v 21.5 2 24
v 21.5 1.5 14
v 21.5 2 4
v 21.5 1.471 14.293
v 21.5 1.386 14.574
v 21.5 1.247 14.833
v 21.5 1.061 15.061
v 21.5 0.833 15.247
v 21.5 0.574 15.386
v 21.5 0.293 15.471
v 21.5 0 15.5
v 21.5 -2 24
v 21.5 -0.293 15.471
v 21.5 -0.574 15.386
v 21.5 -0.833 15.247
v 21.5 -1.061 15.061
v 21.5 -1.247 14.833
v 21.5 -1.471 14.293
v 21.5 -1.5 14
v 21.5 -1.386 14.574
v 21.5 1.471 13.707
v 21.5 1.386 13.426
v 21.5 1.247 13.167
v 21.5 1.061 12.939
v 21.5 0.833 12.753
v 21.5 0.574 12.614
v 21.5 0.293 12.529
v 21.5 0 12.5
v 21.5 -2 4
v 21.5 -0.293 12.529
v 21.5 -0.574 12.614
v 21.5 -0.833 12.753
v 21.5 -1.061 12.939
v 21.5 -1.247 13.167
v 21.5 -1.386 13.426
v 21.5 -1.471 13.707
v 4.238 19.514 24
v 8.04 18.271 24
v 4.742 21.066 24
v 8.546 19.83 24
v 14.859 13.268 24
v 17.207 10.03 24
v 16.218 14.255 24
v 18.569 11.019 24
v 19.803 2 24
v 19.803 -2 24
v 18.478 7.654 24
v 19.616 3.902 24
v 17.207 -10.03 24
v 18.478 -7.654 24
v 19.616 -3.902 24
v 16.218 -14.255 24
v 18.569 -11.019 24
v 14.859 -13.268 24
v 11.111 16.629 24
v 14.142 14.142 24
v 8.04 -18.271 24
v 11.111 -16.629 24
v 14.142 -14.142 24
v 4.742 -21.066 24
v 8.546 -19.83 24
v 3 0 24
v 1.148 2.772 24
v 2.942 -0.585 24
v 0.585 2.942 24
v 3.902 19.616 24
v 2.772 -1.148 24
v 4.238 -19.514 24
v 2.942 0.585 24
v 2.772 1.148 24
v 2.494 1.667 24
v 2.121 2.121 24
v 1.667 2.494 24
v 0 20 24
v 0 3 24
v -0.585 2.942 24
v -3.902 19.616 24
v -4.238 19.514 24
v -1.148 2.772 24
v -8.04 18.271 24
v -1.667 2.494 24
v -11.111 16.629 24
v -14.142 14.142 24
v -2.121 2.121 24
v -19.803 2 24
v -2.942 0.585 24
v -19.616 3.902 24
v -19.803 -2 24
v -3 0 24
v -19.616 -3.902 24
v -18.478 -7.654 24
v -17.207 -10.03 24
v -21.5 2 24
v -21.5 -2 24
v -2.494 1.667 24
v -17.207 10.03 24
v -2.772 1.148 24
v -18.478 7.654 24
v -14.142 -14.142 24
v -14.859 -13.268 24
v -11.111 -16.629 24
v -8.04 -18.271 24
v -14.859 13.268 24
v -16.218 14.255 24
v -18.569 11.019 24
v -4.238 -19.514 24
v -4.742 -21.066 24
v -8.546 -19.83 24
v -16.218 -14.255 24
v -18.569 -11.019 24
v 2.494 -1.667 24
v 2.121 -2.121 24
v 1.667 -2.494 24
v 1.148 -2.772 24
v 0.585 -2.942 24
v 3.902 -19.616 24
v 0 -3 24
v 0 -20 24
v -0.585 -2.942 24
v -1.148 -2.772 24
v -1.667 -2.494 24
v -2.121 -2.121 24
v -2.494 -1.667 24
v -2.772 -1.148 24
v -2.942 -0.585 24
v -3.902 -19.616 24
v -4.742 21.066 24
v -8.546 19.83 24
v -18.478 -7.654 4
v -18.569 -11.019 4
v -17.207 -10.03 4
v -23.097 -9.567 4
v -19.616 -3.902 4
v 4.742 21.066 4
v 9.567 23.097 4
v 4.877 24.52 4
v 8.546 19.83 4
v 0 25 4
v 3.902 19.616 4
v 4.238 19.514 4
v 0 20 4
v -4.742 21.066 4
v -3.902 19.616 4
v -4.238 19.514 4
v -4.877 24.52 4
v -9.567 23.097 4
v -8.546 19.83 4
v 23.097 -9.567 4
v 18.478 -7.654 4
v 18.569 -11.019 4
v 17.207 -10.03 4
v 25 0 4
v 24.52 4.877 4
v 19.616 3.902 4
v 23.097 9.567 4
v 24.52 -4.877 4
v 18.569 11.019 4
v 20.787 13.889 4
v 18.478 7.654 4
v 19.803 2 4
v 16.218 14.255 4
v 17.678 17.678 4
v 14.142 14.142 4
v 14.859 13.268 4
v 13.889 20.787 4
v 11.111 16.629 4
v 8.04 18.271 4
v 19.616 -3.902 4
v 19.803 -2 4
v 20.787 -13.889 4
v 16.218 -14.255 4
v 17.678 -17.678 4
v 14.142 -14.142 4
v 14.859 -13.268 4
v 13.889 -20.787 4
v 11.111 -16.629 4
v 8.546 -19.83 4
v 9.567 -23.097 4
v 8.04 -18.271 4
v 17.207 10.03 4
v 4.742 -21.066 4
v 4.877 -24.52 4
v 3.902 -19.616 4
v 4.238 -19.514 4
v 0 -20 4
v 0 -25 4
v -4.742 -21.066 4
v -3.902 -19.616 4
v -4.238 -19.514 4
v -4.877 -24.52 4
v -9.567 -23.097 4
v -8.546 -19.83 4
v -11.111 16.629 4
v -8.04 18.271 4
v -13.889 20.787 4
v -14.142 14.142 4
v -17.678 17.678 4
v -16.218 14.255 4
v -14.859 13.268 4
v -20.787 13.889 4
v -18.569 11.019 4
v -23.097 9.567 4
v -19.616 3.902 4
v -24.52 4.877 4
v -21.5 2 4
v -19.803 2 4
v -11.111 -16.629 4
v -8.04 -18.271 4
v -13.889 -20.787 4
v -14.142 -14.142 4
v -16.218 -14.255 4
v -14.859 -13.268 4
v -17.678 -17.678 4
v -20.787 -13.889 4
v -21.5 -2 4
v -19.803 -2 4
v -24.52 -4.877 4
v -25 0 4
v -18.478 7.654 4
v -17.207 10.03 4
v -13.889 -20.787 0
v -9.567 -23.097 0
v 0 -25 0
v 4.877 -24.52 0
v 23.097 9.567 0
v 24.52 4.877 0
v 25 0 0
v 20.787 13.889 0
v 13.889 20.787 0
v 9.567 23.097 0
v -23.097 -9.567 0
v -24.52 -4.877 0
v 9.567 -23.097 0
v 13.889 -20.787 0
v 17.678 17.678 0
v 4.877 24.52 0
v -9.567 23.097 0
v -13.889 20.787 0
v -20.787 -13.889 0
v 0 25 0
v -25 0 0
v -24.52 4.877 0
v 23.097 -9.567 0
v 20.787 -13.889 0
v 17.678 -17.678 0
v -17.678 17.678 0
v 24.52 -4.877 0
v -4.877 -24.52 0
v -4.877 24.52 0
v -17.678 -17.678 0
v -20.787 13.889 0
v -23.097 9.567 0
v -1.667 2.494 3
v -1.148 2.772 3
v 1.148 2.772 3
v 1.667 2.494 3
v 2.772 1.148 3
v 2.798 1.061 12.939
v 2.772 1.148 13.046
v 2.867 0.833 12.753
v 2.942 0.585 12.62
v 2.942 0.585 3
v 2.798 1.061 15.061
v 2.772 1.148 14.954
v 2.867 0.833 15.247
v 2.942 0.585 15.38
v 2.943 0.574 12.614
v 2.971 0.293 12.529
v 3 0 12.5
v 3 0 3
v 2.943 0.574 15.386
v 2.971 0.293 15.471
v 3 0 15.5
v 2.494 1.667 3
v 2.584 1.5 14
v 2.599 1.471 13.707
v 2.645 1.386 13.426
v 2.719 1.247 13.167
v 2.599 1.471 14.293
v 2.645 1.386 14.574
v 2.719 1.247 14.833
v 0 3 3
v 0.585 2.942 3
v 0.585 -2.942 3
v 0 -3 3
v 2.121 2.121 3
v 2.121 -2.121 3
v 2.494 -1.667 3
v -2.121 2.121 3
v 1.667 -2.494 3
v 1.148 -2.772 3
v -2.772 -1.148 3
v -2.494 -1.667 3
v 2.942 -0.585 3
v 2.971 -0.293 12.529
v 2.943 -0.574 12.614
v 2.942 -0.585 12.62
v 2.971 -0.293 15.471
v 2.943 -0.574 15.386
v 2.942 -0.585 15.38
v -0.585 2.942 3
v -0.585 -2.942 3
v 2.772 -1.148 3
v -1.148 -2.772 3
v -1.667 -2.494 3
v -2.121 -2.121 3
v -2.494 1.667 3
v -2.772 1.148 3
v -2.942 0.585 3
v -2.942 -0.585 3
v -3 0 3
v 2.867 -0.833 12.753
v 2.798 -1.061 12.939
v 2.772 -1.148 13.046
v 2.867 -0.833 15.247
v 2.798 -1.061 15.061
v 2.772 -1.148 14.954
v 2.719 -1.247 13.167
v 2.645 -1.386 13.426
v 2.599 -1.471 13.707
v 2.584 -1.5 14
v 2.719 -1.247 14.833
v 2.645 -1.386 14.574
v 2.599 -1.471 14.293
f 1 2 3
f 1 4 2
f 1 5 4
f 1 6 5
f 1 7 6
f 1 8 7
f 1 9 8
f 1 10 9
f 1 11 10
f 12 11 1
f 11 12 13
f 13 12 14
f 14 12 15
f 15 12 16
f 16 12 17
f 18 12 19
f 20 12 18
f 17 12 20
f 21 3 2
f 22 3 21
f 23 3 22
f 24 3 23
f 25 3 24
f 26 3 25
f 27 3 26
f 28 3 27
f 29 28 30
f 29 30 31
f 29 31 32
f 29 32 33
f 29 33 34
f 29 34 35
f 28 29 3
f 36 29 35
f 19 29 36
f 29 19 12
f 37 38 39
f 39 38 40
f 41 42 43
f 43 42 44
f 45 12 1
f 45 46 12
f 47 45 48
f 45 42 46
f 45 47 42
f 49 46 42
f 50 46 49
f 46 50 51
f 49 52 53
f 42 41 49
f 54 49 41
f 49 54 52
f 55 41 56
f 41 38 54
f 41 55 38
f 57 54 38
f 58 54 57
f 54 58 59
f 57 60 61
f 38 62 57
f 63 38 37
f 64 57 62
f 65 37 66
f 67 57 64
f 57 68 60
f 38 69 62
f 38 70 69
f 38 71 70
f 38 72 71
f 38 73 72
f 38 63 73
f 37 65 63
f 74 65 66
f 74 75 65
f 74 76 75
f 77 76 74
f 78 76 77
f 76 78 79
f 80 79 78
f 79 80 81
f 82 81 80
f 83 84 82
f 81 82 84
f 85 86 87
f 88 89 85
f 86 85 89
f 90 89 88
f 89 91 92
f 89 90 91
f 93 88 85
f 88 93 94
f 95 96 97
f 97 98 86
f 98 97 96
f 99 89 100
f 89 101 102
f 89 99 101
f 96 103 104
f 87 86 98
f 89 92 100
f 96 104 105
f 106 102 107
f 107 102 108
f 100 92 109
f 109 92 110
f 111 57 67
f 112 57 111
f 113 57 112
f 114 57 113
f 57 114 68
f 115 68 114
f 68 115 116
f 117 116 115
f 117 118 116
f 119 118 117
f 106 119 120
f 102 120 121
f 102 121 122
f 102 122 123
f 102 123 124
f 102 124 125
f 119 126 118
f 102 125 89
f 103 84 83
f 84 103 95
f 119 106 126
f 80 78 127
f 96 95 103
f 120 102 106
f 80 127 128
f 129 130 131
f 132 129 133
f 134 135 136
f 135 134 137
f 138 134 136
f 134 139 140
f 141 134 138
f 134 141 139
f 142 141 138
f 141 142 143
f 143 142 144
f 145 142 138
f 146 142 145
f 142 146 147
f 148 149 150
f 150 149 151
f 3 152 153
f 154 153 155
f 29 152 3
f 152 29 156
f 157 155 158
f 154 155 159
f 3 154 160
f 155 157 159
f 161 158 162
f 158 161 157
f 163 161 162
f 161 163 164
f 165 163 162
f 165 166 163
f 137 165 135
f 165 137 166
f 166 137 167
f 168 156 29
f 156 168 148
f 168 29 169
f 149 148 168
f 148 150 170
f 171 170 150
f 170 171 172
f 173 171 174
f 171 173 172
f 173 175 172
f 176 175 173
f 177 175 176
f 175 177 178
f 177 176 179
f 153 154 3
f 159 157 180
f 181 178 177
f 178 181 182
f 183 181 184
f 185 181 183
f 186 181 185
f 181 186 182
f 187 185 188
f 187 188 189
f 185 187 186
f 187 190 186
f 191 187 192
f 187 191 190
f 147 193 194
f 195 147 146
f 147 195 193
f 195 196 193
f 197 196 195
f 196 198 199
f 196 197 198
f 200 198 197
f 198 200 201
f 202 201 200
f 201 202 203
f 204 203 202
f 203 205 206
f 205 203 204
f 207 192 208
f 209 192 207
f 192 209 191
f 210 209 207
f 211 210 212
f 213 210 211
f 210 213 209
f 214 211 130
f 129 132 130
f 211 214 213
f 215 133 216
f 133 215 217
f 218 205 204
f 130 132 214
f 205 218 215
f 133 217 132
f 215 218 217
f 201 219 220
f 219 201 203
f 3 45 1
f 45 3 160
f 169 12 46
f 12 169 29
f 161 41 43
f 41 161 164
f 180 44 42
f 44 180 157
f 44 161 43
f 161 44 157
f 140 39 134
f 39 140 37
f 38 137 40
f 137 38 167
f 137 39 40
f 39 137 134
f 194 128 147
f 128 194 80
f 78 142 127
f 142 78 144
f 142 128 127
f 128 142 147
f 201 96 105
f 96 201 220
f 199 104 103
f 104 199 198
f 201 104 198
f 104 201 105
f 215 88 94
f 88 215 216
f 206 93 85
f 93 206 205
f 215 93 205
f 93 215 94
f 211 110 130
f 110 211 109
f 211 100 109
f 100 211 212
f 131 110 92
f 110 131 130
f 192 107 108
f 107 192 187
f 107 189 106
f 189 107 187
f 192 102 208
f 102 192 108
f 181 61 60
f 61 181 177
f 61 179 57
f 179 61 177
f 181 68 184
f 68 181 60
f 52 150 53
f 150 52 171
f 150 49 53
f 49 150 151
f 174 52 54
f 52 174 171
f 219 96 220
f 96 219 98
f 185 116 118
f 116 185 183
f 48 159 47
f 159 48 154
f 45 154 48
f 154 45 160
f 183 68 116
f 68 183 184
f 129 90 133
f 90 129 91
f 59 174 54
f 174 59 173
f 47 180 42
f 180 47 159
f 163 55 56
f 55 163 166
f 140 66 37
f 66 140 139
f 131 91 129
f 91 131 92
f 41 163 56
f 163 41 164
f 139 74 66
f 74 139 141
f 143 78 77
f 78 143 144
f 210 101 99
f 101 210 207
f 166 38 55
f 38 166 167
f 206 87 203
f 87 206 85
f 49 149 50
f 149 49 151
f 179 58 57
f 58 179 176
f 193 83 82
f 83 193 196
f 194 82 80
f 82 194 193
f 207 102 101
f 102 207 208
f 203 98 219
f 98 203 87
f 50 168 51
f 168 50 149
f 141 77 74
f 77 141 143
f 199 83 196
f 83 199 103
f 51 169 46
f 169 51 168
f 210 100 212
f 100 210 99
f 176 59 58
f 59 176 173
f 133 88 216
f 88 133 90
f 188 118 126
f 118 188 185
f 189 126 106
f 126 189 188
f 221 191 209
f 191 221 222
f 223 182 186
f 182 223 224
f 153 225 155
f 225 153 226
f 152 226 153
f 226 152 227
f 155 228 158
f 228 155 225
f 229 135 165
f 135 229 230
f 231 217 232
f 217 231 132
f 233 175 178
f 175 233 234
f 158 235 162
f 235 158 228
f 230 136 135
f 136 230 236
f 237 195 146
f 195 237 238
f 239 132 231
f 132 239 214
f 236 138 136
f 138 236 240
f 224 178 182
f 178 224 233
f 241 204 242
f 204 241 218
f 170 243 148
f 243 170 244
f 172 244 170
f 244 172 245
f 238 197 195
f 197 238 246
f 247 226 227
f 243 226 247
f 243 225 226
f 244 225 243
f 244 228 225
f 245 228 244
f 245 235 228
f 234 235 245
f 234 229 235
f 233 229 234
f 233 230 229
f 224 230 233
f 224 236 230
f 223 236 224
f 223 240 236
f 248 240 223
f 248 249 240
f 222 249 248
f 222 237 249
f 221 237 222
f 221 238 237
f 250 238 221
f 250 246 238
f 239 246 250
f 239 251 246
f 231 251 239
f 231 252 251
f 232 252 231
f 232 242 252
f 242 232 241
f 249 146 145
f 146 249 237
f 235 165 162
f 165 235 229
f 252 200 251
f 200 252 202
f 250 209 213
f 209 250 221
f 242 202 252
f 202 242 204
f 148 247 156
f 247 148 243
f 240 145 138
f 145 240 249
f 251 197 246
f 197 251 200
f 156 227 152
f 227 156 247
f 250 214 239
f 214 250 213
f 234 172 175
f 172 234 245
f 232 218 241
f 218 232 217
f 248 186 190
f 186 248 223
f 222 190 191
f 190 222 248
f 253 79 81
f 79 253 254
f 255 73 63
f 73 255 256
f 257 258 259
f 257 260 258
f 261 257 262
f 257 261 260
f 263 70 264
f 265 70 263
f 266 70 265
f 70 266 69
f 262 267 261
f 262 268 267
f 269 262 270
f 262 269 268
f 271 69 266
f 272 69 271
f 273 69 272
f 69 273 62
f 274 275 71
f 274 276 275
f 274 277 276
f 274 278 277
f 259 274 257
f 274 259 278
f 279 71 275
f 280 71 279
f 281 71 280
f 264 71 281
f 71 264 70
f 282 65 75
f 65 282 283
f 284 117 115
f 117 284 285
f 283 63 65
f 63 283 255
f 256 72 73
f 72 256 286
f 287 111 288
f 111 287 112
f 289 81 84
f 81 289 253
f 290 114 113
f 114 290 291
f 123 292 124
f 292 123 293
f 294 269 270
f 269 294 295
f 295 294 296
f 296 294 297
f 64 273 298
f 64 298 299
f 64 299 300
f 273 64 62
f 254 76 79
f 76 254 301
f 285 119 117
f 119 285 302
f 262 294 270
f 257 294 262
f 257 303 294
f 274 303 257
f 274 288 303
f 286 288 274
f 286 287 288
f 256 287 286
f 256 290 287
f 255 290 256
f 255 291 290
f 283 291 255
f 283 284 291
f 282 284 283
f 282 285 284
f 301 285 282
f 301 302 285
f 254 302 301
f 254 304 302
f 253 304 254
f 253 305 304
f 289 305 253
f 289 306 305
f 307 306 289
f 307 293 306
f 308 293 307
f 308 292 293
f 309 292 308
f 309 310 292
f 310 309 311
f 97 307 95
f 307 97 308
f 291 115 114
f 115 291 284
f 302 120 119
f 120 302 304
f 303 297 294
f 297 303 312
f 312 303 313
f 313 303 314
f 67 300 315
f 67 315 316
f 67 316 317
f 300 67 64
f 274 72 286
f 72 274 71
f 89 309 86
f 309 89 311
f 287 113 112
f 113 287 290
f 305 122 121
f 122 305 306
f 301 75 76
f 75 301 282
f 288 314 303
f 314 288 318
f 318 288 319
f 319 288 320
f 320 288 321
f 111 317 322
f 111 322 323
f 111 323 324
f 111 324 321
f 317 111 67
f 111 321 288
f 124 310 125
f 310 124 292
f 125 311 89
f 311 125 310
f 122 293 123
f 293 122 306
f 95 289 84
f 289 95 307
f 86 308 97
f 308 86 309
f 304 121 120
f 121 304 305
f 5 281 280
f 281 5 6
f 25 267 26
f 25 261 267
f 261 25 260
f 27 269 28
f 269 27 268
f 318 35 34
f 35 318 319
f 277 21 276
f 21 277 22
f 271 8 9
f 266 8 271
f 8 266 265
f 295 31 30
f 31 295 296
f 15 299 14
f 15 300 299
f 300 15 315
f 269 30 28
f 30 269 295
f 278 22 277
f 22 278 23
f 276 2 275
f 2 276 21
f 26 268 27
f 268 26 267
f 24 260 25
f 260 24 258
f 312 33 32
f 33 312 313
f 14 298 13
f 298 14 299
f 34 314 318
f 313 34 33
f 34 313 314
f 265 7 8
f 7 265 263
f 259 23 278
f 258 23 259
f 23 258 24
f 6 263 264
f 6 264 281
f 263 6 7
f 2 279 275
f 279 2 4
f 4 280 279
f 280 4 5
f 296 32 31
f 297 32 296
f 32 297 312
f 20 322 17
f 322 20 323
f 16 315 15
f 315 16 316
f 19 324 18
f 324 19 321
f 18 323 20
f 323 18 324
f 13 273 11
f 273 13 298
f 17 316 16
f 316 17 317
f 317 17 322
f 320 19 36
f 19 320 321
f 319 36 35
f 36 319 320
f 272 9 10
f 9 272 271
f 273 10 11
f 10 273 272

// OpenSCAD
$fn = 32;

// ----------------------------------------------------------------------
// Control knob: skirt knob with grip ribs
// ----------------------------------------------------------------------

// --- parameters (mm) ---
skirt_d = 50;             // skirt diameter
skirt_t = 4;              // skirt thickness
rib_w = 4;                // grip rib width
rib_out = 2.5;            // grip rib radial protrusion
n_ribs = 10;              // number of grip ribs
knob_d = 40;              // knob body diameter
knob_h = 20;              // knob body height
bore_d = 6;               // shaft bore diameter
set_d = 3;                // set screw bore diameter
fit_tol = 0.02;           // tolerance for press fits, mm
free_tol = 0.2;           // tolerance for clearance fits, mm

rib_step = 360 / n_ribs;  // rib angular step
total_h = skirt_t + knob_h;  // overall height

difference() {
  union() {
    translate([0, 0, skirt_t]) cylinder(h = knob_h, d = knob_d);
    cylinder(h = skirt_t, d = skirt_d);
    for (i = [0 : n_ribs - 1])
      rotate([0, 0, i * rib_step])
        translate([knob_d / 2 - 1, -rib_w / 2, skirt_t])
          cube([rib_out, rib_w, knob_h]);
  }
  translate([0, 0, skirt_t - 1]) cylinder(h = knob_h + 2, d = bore_d);
  translate([-1, 0, skirt_t + knob_h / 2]) rotate([0, 90, 0])
    cylinder(h = knob_d / 2 + bore_d / 2 + 2, d = set_d);
}
